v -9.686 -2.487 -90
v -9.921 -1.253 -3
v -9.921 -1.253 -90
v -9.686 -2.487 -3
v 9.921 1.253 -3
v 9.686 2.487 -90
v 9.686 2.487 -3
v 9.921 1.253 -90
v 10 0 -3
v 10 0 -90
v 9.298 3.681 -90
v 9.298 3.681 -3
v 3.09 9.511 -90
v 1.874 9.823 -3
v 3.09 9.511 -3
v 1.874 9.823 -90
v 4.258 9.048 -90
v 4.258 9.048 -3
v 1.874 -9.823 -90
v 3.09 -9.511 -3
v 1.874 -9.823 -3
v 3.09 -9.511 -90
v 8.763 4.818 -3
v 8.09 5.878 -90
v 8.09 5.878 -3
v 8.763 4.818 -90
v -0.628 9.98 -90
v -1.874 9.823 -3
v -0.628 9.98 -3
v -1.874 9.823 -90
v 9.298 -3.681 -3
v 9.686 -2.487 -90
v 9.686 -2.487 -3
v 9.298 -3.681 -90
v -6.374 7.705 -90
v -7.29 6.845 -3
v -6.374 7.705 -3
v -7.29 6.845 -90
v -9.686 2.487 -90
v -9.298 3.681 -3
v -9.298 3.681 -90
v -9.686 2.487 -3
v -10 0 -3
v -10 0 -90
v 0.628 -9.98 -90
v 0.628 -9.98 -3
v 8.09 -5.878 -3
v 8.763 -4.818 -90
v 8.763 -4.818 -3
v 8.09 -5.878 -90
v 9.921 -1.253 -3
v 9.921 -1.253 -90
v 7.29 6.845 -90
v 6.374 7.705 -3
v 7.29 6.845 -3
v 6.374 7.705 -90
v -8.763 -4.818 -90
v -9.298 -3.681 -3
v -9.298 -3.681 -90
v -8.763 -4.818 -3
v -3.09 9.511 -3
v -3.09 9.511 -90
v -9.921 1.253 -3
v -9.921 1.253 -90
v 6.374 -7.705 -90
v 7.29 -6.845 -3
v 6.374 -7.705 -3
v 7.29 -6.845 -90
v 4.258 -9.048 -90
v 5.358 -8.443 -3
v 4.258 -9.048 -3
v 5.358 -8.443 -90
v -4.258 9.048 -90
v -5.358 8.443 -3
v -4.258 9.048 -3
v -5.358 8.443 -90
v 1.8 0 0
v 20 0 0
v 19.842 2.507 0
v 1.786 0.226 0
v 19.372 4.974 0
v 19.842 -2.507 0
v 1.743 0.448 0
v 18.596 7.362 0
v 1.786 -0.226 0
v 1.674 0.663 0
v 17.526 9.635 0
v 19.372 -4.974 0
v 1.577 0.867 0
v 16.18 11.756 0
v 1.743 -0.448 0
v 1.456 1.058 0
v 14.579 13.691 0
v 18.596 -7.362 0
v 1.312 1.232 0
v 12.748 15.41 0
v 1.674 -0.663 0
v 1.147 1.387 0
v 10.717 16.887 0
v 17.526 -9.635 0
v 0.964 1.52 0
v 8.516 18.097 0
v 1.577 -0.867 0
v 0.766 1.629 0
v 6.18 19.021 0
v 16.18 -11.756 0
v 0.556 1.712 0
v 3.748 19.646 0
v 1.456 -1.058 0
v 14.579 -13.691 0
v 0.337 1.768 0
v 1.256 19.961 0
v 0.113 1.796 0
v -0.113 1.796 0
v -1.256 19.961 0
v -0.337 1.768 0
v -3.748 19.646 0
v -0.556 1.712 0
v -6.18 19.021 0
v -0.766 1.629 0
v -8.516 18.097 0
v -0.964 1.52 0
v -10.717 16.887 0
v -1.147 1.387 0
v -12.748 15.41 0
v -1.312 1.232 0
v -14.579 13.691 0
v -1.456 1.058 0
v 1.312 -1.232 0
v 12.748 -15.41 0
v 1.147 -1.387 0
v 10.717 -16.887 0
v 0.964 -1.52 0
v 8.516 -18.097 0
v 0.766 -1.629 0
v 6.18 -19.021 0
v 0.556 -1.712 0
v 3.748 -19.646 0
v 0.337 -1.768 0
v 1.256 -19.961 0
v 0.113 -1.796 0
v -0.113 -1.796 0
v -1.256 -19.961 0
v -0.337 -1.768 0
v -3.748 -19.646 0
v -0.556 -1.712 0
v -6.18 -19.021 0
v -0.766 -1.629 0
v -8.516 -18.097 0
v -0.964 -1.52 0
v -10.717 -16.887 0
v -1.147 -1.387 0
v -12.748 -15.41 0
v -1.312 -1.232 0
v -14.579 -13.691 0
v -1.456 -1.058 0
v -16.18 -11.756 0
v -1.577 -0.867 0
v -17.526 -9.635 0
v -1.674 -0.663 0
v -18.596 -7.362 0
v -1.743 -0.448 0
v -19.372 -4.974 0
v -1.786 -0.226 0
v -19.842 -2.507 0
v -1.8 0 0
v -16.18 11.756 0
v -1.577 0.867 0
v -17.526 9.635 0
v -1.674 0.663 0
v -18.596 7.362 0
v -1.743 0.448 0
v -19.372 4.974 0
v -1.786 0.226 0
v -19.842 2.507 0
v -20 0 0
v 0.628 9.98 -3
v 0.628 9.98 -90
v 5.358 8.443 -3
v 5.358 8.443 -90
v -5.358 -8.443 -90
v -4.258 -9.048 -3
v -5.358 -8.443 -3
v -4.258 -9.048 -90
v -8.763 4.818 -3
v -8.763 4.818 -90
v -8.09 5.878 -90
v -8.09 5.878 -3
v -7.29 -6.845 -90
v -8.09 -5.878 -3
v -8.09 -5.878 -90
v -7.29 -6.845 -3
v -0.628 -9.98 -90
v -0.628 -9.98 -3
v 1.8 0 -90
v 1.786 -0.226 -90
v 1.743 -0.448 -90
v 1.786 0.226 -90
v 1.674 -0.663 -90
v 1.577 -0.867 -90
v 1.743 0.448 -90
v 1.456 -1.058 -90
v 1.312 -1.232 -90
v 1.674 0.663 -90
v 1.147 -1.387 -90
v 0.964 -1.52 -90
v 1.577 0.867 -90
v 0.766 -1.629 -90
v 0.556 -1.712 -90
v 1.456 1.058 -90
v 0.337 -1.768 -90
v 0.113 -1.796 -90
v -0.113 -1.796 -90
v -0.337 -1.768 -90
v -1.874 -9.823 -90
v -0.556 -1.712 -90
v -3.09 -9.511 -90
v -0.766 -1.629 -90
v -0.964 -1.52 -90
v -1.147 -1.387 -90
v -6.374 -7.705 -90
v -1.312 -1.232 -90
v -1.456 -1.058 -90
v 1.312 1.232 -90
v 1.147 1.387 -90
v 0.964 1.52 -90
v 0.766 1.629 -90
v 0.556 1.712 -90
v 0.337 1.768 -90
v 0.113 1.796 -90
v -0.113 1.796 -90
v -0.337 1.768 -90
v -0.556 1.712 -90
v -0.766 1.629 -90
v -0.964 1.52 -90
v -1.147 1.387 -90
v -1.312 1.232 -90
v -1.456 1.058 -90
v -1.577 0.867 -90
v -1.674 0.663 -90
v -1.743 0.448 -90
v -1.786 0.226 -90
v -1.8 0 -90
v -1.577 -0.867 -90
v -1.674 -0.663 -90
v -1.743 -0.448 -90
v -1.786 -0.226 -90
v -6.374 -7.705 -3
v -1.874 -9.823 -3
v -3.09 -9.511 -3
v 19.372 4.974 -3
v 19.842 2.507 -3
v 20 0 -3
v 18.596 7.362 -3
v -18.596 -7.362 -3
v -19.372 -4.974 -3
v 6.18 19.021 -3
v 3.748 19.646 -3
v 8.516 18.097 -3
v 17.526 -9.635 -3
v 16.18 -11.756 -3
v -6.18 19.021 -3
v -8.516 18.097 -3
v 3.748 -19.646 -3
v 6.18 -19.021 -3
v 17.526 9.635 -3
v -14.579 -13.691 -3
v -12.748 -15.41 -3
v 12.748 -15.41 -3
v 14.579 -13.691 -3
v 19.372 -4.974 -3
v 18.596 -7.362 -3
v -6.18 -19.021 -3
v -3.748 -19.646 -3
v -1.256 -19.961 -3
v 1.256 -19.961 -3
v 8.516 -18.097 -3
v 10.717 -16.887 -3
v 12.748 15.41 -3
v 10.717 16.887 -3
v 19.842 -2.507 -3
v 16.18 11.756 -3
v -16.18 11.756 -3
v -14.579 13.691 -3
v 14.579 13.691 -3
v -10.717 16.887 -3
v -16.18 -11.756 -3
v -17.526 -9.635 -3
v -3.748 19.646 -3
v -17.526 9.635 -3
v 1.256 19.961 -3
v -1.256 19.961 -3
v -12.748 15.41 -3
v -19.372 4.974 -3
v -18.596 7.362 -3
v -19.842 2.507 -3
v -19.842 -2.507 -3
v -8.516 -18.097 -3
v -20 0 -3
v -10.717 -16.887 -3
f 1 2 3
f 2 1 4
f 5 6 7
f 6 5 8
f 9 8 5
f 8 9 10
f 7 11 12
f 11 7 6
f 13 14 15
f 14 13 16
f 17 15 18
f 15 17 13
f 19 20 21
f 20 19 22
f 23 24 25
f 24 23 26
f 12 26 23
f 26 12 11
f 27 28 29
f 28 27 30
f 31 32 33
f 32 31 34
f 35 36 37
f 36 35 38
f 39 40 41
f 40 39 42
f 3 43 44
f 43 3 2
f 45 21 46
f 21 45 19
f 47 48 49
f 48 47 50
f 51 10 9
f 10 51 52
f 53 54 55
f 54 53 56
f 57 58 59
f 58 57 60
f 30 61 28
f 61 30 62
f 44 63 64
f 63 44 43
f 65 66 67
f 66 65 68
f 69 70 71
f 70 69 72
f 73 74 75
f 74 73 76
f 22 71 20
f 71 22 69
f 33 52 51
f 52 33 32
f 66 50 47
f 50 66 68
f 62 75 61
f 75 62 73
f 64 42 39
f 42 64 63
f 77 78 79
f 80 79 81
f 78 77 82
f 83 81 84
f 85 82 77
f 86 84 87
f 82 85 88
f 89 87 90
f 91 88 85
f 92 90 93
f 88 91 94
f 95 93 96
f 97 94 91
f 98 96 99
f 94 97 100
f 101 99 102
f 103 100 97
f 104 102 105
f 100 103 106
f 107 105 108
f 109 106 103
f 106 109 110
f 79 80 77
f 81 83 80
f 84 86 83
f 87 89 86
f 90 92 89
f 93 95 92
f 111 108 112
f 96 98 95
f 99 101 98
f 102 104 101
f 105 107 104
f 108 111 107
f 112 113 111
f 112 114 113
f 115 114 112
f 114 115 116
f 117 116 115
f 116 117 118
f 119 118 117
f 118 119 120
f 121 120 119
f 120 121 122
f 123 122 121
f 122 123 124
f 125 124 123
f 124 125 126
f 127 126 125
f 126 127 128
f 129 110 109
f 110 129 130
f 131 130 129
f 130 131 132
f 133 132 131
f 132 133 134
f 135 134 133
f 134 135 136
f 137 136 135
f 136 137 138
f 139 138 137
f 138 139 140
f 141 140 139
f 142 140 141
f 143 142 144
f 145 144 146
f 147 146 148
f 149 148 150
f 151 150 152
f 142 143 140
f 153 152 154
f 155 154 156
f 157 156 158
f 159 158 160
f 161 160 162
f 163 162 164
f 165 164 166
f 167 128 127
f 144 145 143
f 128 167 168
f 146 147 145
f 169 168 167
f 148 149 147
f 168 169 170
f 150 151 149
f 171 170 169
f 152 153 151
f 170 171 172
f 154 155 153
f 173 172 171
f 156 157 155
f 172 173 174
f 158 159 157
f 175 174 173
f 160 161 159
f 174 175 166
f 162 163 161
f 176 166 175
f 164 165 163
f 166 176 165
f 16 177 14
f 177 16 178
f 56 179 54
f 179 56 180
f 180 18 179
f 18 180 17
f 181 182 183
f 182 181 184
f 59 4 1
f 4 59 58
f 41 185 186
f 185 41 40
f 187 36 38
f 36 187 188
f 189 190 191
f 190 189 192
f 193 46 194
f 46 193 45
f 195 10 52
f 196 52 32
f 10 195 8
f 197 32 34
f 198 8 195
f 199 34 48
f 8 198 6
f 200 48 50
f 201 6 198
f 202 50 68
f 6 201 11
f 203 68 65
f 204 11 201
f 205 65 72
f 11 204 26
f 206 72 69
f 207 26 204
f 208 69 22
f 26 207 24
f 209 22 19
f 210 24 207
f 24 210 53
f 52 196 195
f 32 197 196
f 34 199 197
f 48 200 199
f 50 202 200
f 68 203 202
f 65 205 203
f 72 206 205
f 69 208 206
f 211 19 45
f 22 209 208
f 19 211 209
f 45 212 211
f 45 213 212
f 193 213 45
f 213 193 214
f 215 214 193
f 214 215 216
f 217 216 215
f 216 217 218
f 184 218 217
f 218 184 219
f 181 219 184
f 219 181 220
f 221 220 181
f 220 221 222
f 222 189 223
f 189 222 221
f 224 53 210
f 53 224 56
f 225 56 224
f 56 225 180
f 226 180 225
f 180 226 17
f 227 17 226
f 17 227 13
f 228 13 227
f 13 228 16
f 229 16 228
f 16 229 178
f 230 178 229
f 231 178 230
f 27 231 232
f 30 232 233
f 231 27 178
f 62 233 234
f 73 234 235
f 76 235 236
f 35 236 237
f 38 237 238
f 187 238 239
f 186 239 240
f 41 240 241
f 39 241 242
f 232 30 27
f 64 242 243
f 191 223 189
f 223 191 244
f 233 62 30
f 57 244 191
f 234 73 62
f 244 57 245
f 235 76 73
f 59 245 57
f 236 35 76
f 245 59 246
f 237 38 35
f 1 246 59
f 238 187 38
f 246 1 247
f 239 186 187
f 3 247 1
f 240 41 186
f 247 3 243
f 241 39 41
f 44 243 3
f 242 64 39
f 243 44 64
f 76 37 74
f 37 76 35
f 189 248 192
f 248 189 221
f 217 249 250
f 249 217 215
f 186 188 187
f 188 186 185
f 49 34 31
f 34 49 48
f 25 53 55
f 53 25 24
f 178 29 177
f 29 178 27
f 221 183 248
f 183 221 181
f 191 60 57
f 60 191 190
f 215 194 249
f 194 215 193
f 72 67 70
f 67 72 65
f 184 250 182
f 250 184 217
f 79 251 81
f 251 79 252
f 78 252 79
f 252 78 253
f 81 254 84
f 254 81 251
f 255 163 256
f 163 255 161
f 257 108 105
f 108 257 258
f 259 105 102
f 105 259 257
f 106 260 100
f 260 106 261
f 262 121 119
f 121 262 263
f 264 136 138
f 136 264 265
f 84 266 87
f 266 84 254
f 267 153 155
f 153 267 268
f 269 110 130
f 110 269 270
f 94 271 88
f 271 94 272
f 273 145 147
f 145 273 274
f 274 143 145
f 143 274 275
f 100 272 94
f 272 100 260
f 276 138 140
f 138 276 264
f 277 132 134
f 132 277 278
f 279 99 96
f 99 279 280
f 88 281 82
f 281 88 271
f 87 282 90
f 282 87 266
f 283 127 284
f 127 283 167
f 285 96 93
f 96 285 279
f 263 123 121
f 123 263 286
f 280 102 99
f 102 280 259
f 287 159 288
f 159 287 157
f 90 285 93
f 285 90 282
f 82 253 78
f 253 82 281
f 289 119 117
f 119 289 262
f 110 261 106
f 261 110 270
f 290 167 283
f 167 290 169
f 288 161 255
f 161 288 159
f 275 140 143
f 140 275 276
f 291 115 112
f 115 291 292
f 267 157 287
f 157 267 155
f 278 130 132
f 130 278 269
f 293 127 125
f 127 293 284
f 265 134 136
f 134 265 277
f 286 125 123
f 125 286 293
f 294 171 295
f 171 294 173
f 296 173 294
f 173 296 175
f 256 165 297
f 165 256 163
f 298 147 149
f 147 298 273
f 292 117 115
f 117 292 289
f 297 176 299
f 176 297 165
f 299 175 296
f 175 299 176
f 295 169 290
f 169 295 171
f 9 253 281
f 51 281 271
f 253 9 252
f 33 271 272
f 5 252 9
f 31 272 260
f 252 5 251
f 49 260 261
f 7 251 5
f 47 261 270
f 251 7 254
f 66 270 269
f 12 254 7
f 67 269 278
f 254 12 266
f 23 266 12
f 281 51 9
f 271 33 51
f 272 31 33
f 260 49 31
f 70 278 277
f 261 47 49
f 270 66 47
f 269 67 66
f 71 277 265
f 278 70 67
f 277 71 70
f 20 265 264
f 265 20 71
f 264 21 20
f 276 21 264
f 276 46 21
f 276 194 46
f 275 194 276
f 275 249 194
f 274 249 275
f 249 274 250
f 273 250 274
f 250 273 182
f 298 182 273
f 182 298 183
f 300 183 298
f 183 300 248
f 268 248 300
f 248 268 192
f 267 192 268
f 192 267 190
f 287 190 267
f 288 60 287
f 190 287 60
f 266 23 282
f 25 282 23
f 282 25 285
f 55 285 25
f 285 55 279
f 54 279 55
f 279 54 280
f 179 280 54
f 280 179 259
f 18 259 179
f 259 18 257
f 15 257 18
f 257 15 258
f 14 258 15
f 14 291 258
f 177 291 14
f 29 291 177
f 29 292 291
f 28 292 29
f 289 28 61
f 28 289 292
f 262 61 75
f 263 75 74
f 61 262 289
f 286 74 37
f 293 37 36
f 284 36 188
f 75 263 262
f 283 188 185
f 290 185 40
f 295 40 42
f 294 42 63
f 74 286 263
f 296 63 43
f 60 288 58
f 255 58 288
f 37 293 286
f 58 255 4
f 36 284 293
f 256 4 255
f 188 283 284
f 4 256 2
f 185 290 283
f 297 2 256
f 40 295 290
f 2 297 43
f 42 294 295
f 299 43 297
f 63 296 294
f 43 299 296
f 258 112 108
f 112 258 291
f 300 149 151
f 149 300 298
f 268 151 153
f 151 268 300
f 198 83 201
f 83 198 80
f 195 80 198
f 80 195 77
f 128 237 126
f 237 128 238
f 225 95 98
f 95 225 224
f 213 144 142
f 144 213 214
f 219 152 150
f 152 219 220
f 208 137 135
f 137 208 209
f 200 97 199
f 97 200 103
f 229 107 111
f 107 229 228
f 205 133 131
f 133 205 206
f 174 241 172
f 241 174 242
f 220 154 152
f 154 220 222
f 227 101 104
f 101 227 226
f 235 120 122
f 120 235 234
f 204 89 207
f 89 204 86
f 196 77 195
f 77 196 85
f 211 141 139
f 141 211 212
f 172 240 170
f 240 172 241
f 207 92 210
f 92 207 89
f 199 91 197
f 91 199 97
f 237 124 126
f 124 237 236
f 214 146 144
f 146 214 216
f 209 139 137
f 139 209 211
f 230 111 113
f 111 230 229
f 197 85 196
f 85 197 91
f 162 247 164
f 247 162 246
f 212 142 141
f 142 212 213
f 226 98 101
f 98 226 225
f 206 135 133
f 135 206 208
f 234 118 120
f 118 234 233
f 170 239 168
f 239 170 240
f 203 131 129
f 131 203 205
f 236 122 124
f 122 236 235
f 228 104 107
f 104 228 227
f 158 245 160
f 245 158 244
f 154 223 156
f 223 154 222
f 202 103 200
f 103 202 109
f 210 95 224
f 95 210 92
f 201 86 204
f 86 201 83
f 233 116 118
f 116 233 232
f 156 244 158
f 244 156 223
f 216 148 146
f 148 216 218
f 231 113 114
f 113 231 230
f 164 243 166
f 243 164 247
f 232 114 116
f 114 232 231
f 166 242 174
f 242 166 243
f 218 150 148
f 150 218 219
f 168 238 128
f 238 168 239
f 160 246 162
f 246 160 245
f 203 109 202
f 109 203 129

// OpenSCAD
$fn = 50;


difference() {
	union() {
		translate(v = [0, 0, -90.0000000000]) {
			cylinder(h = 90, r = 10.0000000000);
		}
		translate(v = [0, 0, -3.0000000000]) {
			cylinder(h = 3, r = 20.0000000000);
		}
	}
	union() {
		#translate(v = [0, 0, -90]) {
			cylinder(h = 90, r = 1.8000000000);
		}
	}
}
